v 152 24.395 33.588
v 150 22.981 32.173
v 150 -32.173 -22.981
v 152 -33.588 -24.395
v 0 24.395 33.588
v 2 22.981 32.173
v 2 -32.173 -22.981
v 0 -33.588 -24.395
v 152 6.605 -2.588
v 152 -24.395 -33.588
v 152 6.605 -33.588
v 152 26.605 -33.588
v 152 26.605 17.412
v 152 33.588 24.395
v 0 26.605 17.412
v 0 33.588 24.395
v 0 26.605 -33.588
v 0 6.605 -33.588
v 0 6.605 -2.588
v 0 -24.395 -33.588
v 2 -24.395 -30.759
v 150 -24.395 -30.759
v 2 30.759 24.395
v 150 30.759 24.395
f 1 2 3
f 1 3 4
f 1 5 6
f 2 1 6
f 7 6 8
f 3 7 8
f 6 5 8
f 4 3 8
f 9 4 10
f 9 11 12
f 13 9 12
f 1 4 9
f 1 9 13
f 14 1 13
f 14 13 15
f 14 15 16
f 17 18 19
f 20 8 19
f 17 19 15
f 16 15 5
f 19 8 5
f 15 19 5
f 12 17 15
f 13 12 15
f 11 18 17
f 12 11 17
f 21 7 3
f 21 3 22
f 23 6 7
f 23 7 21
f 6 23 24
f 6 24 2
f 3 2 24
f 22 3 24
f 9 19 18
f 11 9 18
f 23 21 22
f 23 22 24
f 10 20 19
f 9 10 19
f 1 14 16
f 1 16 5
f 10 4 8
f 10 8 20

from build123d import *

# Parameters (mm, degrees)
F1_DEPTH = 152
F2_T     = -2
F4_DEPTH = 152


with BuildPart() as f1:
    # F0 (on Right) → F1 (new body)
    with BuildSketch(Plane.YZ):
        Polygon((24.395184, 33.587572), (-33.587572, -24.395184), (-24.395184, -33.587572), (33.587572, 24.395184), align=None)
    extrude(amount=F1_DEPTH)

    # F2
    f2_openings = [f1.faces().sort_by_distance(p)[0] for p in [
        (76, -4.596194, 4.596194),
    ]]
    offset(amount=F2_T, openings=f2_openings)

    # F3 (on Right) → F4 (join)
    with BuildSketch(Plane.YZ):
        Polygon((7.990418, 0), (6.604816, 0), (6.604816, -33.587572), (26.604816, -33.587572), (26.604816, 0), align=None)
        Polygon((26.604816, 18.73309), (7.990418, 0), (26.604816, 0), align=None)
    extrude(amount=F4_DEPTH)


solid = f1.part
